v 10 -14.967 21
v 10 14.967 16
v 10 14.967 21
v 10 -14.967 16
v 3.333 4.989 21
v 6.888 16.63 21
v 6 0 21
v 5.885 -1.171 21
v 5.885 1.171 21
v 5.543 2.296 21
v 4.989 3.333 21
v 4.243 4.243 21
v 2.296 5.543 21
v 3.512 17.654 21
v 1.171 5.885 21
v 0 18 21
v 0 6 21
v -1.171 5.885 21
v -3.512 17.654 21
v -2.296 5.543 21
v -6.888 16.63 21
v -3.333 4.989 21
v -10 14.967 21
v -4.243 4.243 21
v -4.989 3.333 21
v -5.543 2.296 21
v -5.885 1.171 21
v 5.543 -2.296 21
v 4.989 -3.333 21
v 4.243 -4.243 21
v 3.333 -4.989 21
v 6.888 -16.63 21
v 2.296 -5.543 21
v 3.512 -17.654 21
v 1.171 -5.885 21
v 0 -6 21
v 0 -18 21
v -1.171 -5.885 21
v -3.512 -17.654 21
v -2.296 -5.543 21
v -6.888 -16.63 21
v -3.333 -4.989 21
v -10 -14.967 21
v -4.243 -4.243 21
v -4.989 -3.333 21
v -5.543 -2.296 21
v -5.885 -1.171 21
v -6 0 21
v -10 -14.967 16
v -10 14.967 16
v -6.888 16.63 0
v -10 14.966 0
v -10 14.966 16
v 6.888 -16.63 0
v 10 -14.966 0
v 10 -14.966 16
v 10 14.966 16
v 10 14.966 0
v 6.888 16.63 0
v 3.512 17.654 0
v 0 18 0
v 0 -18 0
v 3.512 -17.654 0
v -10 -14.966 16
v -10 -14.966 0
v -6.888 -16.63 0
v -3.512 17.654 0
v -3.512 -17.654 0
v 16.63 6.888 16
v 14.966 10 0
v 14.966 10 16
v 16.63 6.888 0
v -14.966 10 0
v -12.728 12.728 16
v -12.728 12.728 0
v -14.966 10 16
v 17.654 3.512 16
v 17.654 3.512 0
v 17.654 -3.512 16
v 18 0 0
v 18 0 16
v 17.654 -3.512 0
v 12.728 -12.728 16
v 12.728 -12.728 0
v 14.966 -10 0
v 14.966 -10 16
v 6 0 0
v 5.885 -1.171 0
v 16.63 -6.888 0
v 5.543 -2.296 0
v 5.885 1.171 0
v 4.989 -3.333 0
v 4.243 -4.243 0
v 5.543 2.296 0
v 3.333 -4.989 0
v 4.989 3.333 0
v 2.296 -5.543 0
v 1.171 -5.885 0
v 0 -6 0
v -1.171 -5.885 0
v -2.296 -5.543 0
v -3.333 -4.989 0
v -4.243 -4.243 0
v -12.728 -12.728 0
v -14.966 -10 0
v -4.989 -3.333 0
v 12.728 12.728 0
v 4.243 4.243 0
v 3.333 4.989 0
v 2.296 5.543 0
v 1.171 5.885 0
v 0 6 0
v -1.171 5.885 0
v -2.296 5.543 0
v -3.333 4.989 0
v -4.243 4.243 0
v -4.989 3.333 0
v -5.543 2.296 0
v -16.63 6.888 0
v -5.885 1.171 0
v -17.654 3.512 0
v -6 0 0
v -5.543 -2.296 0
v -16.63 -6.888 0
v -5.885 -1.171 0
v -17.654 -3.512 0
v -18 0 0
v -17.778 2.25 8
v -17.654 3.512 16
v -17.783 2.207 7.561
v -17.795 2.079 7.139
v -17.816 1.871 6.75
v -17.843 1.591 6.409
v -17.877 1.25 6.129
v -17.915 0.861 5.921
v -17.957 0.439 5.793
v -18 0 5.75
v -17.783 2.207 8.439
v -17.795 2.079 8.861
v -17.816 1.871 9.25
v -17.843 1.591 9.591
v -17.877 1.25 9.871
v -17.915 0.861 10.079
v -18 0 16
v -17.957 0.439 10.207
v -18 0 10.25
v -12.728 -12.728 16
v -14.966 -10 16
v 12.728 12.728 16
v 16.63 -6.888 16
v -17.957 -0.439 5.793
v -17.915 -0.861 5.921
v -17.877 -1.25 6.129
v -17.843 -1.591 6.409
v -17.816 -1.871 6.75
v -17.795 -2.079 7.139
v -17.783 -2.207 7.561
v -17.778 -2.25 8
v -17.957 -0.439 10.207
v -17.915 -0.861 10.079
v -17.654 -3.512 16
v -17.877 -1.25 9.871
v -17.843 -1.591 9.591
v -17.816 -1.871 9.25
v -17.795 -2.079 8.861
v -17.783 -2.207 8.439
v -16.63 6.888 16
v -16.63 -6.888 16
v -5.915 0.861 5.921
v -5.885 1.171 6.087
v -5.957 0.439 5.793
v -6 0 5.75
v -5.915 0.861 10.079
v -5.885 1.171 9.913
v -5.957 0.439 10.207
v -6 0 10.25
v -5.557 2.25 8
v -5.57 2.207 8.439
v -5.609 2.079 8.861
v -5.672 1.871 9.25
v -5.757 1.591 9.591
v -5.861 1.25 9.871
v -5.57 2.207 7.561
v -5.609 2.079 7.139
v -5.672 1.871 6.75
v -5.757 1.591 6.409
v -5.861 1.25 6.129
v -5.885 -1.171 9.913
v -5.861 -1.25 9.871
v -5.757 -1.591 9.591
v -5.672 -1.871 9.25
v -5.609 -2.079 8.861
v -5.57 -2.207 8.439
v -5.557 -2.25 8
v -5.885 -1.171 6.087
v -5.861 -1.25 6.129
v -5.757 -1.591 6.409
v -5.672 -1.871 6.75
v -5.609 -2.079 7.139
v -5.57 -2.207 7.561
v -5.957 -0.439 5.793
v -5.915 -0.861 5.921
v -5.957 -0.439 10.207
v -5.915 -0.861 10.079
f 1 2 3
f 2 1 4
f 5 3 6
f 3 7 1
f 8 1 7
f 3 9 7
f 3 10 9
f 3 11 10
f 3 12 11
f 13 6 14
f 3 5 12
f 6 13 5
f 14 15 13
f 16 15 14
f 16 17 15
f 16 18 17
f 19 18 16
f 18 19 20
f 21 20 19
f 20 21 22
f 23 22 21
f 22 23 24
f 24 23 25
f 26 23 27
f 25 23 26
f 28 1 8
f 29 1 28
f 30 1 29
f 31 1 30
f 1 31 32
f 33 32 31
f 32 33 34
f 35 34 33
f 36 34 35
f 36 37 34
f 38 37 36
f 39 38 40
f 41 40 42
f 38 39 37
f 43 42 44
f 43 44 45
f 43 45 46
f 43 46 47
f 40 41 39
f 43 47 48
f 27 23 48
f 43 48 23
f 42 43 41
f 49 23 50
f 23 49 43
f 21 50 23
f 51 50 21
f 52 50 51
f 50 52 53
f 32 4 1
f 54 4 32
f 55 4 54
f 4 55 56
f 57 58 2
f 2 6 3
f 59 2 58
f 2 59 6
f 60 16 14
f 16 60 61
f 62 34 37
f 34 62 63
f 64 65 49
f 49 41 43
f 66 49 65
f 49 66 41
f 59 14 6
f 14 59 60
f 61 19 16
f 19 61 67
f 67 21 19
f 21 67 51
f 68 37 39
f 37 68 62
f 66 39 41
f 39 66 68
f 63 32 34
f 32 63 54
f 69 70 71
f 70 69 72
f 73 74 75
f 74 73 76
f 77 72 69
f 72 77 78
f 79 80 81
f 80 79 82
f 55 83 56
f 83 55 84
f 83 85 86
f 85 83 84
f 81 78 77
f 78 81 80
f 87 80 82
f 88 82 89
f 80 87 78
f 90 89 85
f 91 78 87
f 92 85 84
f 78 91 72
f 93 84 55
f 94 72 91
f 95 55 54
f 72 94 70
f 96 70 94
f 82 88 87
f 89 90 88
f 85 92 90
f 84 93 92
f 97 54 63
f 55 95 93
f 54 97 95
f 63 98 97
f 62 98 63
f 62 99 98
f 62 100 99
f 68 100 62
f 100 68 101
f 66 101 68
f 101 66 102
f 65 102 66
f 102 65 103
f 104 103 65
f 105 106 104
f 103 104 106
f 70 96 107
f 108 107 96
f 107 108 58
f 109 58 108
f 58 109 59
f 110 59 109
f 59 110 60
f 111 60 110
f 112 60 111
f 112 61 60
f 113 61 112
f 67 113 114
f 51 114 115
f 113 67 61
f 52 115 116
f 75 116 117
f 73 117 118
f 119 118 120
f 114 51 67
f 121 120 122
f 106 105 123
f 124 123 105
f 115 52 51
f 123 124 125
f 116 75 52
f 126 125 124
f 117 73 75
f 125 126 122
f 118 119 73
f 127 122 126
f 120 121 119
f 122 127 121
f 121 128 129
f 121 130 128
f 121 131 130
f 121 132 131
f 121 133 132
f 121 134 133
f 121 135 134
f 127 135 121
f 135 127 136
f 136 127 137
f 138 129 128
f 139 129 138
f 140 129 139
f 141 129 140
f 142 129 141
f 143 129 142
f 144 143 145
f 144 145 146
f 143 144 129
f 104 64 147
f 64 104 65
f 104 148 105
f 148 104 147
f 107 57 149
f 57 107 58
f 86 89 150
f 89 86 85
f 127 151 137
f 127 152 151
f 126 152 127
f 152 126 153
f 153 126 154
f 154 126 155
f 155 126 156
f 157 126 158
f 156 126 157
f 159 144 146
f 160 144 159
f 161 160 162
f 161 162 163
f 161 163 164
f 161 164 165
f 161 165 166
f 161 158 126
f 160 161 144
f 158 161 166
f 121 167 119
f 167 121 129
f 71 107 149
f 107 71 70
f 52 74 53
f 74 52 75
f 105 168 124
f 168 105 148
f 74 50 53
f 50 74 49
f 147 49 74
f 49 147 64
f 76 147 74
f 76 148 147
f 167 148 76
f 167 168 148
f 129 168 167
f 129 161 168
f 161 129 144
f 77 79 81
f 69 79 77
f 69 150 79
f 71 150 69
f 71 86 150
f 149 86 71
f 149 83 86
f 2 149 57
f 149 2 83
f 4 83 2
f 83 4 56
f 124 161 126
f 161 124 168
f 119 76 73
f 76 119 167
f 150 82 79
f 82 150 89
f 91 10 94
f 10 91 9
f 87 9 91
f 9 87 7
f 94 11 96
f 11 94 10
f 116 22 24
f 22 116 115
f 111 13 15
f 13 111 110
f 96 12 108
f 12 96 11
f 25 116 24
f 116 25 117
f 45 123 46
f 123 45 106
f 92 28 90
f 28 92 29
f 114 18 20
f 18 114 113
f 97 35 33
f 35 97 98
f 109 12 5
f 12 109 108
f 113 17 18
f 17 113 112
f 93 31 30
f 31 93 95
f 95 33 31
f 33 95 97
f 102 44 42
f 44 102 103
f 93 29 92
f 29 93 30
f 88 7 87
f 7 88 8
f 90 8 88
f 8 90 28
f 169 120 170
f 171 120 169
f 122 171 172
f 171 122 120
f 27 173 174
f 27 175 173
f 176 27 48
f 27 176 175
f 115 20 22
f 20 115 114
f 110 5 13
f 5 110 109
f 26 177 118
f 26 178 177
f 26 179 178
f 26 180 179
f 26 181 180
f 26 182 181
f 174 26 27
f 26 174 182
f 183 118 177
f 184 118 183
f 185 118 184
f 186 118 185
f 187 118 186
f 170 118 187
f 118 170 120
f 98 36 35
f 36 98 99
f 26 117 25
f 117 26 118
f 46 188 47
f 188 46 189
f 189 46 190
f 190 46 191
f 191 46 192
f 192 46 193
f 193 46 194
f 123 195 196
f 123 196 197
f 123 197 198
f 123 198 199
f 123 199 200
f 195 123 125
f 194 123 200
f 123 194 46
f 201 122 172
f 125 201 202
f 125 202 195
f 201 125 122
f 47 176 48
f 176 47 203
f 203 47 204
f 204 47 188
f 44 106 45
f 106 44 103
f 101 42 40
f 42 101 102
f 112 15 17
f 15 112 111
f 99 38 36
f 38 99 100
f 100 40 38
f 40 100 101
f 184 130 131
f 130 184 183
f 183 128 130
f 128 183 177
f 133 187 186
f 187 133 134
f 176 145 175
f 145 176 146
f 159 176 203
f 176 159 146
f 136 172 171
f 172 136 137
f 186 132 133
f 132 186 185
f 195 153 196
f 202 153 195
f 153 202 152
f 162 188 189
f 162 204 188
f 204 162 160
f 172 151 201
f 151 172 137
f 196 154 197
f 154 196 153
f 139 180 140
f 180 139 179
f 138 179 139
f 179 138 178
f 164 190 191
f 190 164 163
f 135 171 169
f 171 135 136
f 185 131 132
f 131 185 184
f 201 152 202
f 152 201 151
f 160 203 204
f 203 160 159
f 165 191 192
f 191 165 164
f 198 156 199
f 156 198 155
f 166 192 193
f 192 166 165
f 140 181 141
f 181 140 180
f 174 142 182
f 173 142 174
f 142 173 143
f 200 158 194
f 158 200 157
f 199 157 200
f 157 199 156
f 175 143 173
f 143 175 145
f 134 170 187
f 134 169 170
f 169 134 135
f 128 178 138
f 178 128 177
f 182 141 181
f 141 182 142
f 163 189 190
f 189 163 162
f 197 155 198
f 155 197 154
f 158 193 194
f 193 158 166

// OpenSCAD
$fn = 32;

// ----------------------------------------------------------------------
// Oldham coupling hub: 36 x 21 mm
// ----------------------------------------------------------------------

// --- parameters (mm) ---
hub_d = 36;               // hub diameter
hub_l = 16;               // hub length
bore_d = 12;              // shaft bore
tongue_w = 20;            // drive tongue width
tongue_h = 5;             // drive tongue height
set_d = 4.5;              // set screw tap hole

module hub() {
  cylinder(h = hub_l, d = hub_d);
  /* tongue, clipped to the hub disc and sunk 1 mm into the face */
  intersection() {
    translate([-tongue_w / 2, -hub_d / 2, hub_l - 1])
      cube([tongue_w, hub_d, tongue_h + 1]);
    translate([0, 0, hub_l - 1]) cylinder(h = tongue_h + 1, d = hub_d);
  }
}

difference() {
  hub();
  translate([0, 0, -1]) cylinder(h = hub_l + tongue_h + 2, d = bore_d);
  translate([-hub_d / 2 - 1, 0, hub_l * 0.5])
    rotate([0, 90, 0]) cylinder(h = hub_d / 2 + 2, d = set_d);
}
